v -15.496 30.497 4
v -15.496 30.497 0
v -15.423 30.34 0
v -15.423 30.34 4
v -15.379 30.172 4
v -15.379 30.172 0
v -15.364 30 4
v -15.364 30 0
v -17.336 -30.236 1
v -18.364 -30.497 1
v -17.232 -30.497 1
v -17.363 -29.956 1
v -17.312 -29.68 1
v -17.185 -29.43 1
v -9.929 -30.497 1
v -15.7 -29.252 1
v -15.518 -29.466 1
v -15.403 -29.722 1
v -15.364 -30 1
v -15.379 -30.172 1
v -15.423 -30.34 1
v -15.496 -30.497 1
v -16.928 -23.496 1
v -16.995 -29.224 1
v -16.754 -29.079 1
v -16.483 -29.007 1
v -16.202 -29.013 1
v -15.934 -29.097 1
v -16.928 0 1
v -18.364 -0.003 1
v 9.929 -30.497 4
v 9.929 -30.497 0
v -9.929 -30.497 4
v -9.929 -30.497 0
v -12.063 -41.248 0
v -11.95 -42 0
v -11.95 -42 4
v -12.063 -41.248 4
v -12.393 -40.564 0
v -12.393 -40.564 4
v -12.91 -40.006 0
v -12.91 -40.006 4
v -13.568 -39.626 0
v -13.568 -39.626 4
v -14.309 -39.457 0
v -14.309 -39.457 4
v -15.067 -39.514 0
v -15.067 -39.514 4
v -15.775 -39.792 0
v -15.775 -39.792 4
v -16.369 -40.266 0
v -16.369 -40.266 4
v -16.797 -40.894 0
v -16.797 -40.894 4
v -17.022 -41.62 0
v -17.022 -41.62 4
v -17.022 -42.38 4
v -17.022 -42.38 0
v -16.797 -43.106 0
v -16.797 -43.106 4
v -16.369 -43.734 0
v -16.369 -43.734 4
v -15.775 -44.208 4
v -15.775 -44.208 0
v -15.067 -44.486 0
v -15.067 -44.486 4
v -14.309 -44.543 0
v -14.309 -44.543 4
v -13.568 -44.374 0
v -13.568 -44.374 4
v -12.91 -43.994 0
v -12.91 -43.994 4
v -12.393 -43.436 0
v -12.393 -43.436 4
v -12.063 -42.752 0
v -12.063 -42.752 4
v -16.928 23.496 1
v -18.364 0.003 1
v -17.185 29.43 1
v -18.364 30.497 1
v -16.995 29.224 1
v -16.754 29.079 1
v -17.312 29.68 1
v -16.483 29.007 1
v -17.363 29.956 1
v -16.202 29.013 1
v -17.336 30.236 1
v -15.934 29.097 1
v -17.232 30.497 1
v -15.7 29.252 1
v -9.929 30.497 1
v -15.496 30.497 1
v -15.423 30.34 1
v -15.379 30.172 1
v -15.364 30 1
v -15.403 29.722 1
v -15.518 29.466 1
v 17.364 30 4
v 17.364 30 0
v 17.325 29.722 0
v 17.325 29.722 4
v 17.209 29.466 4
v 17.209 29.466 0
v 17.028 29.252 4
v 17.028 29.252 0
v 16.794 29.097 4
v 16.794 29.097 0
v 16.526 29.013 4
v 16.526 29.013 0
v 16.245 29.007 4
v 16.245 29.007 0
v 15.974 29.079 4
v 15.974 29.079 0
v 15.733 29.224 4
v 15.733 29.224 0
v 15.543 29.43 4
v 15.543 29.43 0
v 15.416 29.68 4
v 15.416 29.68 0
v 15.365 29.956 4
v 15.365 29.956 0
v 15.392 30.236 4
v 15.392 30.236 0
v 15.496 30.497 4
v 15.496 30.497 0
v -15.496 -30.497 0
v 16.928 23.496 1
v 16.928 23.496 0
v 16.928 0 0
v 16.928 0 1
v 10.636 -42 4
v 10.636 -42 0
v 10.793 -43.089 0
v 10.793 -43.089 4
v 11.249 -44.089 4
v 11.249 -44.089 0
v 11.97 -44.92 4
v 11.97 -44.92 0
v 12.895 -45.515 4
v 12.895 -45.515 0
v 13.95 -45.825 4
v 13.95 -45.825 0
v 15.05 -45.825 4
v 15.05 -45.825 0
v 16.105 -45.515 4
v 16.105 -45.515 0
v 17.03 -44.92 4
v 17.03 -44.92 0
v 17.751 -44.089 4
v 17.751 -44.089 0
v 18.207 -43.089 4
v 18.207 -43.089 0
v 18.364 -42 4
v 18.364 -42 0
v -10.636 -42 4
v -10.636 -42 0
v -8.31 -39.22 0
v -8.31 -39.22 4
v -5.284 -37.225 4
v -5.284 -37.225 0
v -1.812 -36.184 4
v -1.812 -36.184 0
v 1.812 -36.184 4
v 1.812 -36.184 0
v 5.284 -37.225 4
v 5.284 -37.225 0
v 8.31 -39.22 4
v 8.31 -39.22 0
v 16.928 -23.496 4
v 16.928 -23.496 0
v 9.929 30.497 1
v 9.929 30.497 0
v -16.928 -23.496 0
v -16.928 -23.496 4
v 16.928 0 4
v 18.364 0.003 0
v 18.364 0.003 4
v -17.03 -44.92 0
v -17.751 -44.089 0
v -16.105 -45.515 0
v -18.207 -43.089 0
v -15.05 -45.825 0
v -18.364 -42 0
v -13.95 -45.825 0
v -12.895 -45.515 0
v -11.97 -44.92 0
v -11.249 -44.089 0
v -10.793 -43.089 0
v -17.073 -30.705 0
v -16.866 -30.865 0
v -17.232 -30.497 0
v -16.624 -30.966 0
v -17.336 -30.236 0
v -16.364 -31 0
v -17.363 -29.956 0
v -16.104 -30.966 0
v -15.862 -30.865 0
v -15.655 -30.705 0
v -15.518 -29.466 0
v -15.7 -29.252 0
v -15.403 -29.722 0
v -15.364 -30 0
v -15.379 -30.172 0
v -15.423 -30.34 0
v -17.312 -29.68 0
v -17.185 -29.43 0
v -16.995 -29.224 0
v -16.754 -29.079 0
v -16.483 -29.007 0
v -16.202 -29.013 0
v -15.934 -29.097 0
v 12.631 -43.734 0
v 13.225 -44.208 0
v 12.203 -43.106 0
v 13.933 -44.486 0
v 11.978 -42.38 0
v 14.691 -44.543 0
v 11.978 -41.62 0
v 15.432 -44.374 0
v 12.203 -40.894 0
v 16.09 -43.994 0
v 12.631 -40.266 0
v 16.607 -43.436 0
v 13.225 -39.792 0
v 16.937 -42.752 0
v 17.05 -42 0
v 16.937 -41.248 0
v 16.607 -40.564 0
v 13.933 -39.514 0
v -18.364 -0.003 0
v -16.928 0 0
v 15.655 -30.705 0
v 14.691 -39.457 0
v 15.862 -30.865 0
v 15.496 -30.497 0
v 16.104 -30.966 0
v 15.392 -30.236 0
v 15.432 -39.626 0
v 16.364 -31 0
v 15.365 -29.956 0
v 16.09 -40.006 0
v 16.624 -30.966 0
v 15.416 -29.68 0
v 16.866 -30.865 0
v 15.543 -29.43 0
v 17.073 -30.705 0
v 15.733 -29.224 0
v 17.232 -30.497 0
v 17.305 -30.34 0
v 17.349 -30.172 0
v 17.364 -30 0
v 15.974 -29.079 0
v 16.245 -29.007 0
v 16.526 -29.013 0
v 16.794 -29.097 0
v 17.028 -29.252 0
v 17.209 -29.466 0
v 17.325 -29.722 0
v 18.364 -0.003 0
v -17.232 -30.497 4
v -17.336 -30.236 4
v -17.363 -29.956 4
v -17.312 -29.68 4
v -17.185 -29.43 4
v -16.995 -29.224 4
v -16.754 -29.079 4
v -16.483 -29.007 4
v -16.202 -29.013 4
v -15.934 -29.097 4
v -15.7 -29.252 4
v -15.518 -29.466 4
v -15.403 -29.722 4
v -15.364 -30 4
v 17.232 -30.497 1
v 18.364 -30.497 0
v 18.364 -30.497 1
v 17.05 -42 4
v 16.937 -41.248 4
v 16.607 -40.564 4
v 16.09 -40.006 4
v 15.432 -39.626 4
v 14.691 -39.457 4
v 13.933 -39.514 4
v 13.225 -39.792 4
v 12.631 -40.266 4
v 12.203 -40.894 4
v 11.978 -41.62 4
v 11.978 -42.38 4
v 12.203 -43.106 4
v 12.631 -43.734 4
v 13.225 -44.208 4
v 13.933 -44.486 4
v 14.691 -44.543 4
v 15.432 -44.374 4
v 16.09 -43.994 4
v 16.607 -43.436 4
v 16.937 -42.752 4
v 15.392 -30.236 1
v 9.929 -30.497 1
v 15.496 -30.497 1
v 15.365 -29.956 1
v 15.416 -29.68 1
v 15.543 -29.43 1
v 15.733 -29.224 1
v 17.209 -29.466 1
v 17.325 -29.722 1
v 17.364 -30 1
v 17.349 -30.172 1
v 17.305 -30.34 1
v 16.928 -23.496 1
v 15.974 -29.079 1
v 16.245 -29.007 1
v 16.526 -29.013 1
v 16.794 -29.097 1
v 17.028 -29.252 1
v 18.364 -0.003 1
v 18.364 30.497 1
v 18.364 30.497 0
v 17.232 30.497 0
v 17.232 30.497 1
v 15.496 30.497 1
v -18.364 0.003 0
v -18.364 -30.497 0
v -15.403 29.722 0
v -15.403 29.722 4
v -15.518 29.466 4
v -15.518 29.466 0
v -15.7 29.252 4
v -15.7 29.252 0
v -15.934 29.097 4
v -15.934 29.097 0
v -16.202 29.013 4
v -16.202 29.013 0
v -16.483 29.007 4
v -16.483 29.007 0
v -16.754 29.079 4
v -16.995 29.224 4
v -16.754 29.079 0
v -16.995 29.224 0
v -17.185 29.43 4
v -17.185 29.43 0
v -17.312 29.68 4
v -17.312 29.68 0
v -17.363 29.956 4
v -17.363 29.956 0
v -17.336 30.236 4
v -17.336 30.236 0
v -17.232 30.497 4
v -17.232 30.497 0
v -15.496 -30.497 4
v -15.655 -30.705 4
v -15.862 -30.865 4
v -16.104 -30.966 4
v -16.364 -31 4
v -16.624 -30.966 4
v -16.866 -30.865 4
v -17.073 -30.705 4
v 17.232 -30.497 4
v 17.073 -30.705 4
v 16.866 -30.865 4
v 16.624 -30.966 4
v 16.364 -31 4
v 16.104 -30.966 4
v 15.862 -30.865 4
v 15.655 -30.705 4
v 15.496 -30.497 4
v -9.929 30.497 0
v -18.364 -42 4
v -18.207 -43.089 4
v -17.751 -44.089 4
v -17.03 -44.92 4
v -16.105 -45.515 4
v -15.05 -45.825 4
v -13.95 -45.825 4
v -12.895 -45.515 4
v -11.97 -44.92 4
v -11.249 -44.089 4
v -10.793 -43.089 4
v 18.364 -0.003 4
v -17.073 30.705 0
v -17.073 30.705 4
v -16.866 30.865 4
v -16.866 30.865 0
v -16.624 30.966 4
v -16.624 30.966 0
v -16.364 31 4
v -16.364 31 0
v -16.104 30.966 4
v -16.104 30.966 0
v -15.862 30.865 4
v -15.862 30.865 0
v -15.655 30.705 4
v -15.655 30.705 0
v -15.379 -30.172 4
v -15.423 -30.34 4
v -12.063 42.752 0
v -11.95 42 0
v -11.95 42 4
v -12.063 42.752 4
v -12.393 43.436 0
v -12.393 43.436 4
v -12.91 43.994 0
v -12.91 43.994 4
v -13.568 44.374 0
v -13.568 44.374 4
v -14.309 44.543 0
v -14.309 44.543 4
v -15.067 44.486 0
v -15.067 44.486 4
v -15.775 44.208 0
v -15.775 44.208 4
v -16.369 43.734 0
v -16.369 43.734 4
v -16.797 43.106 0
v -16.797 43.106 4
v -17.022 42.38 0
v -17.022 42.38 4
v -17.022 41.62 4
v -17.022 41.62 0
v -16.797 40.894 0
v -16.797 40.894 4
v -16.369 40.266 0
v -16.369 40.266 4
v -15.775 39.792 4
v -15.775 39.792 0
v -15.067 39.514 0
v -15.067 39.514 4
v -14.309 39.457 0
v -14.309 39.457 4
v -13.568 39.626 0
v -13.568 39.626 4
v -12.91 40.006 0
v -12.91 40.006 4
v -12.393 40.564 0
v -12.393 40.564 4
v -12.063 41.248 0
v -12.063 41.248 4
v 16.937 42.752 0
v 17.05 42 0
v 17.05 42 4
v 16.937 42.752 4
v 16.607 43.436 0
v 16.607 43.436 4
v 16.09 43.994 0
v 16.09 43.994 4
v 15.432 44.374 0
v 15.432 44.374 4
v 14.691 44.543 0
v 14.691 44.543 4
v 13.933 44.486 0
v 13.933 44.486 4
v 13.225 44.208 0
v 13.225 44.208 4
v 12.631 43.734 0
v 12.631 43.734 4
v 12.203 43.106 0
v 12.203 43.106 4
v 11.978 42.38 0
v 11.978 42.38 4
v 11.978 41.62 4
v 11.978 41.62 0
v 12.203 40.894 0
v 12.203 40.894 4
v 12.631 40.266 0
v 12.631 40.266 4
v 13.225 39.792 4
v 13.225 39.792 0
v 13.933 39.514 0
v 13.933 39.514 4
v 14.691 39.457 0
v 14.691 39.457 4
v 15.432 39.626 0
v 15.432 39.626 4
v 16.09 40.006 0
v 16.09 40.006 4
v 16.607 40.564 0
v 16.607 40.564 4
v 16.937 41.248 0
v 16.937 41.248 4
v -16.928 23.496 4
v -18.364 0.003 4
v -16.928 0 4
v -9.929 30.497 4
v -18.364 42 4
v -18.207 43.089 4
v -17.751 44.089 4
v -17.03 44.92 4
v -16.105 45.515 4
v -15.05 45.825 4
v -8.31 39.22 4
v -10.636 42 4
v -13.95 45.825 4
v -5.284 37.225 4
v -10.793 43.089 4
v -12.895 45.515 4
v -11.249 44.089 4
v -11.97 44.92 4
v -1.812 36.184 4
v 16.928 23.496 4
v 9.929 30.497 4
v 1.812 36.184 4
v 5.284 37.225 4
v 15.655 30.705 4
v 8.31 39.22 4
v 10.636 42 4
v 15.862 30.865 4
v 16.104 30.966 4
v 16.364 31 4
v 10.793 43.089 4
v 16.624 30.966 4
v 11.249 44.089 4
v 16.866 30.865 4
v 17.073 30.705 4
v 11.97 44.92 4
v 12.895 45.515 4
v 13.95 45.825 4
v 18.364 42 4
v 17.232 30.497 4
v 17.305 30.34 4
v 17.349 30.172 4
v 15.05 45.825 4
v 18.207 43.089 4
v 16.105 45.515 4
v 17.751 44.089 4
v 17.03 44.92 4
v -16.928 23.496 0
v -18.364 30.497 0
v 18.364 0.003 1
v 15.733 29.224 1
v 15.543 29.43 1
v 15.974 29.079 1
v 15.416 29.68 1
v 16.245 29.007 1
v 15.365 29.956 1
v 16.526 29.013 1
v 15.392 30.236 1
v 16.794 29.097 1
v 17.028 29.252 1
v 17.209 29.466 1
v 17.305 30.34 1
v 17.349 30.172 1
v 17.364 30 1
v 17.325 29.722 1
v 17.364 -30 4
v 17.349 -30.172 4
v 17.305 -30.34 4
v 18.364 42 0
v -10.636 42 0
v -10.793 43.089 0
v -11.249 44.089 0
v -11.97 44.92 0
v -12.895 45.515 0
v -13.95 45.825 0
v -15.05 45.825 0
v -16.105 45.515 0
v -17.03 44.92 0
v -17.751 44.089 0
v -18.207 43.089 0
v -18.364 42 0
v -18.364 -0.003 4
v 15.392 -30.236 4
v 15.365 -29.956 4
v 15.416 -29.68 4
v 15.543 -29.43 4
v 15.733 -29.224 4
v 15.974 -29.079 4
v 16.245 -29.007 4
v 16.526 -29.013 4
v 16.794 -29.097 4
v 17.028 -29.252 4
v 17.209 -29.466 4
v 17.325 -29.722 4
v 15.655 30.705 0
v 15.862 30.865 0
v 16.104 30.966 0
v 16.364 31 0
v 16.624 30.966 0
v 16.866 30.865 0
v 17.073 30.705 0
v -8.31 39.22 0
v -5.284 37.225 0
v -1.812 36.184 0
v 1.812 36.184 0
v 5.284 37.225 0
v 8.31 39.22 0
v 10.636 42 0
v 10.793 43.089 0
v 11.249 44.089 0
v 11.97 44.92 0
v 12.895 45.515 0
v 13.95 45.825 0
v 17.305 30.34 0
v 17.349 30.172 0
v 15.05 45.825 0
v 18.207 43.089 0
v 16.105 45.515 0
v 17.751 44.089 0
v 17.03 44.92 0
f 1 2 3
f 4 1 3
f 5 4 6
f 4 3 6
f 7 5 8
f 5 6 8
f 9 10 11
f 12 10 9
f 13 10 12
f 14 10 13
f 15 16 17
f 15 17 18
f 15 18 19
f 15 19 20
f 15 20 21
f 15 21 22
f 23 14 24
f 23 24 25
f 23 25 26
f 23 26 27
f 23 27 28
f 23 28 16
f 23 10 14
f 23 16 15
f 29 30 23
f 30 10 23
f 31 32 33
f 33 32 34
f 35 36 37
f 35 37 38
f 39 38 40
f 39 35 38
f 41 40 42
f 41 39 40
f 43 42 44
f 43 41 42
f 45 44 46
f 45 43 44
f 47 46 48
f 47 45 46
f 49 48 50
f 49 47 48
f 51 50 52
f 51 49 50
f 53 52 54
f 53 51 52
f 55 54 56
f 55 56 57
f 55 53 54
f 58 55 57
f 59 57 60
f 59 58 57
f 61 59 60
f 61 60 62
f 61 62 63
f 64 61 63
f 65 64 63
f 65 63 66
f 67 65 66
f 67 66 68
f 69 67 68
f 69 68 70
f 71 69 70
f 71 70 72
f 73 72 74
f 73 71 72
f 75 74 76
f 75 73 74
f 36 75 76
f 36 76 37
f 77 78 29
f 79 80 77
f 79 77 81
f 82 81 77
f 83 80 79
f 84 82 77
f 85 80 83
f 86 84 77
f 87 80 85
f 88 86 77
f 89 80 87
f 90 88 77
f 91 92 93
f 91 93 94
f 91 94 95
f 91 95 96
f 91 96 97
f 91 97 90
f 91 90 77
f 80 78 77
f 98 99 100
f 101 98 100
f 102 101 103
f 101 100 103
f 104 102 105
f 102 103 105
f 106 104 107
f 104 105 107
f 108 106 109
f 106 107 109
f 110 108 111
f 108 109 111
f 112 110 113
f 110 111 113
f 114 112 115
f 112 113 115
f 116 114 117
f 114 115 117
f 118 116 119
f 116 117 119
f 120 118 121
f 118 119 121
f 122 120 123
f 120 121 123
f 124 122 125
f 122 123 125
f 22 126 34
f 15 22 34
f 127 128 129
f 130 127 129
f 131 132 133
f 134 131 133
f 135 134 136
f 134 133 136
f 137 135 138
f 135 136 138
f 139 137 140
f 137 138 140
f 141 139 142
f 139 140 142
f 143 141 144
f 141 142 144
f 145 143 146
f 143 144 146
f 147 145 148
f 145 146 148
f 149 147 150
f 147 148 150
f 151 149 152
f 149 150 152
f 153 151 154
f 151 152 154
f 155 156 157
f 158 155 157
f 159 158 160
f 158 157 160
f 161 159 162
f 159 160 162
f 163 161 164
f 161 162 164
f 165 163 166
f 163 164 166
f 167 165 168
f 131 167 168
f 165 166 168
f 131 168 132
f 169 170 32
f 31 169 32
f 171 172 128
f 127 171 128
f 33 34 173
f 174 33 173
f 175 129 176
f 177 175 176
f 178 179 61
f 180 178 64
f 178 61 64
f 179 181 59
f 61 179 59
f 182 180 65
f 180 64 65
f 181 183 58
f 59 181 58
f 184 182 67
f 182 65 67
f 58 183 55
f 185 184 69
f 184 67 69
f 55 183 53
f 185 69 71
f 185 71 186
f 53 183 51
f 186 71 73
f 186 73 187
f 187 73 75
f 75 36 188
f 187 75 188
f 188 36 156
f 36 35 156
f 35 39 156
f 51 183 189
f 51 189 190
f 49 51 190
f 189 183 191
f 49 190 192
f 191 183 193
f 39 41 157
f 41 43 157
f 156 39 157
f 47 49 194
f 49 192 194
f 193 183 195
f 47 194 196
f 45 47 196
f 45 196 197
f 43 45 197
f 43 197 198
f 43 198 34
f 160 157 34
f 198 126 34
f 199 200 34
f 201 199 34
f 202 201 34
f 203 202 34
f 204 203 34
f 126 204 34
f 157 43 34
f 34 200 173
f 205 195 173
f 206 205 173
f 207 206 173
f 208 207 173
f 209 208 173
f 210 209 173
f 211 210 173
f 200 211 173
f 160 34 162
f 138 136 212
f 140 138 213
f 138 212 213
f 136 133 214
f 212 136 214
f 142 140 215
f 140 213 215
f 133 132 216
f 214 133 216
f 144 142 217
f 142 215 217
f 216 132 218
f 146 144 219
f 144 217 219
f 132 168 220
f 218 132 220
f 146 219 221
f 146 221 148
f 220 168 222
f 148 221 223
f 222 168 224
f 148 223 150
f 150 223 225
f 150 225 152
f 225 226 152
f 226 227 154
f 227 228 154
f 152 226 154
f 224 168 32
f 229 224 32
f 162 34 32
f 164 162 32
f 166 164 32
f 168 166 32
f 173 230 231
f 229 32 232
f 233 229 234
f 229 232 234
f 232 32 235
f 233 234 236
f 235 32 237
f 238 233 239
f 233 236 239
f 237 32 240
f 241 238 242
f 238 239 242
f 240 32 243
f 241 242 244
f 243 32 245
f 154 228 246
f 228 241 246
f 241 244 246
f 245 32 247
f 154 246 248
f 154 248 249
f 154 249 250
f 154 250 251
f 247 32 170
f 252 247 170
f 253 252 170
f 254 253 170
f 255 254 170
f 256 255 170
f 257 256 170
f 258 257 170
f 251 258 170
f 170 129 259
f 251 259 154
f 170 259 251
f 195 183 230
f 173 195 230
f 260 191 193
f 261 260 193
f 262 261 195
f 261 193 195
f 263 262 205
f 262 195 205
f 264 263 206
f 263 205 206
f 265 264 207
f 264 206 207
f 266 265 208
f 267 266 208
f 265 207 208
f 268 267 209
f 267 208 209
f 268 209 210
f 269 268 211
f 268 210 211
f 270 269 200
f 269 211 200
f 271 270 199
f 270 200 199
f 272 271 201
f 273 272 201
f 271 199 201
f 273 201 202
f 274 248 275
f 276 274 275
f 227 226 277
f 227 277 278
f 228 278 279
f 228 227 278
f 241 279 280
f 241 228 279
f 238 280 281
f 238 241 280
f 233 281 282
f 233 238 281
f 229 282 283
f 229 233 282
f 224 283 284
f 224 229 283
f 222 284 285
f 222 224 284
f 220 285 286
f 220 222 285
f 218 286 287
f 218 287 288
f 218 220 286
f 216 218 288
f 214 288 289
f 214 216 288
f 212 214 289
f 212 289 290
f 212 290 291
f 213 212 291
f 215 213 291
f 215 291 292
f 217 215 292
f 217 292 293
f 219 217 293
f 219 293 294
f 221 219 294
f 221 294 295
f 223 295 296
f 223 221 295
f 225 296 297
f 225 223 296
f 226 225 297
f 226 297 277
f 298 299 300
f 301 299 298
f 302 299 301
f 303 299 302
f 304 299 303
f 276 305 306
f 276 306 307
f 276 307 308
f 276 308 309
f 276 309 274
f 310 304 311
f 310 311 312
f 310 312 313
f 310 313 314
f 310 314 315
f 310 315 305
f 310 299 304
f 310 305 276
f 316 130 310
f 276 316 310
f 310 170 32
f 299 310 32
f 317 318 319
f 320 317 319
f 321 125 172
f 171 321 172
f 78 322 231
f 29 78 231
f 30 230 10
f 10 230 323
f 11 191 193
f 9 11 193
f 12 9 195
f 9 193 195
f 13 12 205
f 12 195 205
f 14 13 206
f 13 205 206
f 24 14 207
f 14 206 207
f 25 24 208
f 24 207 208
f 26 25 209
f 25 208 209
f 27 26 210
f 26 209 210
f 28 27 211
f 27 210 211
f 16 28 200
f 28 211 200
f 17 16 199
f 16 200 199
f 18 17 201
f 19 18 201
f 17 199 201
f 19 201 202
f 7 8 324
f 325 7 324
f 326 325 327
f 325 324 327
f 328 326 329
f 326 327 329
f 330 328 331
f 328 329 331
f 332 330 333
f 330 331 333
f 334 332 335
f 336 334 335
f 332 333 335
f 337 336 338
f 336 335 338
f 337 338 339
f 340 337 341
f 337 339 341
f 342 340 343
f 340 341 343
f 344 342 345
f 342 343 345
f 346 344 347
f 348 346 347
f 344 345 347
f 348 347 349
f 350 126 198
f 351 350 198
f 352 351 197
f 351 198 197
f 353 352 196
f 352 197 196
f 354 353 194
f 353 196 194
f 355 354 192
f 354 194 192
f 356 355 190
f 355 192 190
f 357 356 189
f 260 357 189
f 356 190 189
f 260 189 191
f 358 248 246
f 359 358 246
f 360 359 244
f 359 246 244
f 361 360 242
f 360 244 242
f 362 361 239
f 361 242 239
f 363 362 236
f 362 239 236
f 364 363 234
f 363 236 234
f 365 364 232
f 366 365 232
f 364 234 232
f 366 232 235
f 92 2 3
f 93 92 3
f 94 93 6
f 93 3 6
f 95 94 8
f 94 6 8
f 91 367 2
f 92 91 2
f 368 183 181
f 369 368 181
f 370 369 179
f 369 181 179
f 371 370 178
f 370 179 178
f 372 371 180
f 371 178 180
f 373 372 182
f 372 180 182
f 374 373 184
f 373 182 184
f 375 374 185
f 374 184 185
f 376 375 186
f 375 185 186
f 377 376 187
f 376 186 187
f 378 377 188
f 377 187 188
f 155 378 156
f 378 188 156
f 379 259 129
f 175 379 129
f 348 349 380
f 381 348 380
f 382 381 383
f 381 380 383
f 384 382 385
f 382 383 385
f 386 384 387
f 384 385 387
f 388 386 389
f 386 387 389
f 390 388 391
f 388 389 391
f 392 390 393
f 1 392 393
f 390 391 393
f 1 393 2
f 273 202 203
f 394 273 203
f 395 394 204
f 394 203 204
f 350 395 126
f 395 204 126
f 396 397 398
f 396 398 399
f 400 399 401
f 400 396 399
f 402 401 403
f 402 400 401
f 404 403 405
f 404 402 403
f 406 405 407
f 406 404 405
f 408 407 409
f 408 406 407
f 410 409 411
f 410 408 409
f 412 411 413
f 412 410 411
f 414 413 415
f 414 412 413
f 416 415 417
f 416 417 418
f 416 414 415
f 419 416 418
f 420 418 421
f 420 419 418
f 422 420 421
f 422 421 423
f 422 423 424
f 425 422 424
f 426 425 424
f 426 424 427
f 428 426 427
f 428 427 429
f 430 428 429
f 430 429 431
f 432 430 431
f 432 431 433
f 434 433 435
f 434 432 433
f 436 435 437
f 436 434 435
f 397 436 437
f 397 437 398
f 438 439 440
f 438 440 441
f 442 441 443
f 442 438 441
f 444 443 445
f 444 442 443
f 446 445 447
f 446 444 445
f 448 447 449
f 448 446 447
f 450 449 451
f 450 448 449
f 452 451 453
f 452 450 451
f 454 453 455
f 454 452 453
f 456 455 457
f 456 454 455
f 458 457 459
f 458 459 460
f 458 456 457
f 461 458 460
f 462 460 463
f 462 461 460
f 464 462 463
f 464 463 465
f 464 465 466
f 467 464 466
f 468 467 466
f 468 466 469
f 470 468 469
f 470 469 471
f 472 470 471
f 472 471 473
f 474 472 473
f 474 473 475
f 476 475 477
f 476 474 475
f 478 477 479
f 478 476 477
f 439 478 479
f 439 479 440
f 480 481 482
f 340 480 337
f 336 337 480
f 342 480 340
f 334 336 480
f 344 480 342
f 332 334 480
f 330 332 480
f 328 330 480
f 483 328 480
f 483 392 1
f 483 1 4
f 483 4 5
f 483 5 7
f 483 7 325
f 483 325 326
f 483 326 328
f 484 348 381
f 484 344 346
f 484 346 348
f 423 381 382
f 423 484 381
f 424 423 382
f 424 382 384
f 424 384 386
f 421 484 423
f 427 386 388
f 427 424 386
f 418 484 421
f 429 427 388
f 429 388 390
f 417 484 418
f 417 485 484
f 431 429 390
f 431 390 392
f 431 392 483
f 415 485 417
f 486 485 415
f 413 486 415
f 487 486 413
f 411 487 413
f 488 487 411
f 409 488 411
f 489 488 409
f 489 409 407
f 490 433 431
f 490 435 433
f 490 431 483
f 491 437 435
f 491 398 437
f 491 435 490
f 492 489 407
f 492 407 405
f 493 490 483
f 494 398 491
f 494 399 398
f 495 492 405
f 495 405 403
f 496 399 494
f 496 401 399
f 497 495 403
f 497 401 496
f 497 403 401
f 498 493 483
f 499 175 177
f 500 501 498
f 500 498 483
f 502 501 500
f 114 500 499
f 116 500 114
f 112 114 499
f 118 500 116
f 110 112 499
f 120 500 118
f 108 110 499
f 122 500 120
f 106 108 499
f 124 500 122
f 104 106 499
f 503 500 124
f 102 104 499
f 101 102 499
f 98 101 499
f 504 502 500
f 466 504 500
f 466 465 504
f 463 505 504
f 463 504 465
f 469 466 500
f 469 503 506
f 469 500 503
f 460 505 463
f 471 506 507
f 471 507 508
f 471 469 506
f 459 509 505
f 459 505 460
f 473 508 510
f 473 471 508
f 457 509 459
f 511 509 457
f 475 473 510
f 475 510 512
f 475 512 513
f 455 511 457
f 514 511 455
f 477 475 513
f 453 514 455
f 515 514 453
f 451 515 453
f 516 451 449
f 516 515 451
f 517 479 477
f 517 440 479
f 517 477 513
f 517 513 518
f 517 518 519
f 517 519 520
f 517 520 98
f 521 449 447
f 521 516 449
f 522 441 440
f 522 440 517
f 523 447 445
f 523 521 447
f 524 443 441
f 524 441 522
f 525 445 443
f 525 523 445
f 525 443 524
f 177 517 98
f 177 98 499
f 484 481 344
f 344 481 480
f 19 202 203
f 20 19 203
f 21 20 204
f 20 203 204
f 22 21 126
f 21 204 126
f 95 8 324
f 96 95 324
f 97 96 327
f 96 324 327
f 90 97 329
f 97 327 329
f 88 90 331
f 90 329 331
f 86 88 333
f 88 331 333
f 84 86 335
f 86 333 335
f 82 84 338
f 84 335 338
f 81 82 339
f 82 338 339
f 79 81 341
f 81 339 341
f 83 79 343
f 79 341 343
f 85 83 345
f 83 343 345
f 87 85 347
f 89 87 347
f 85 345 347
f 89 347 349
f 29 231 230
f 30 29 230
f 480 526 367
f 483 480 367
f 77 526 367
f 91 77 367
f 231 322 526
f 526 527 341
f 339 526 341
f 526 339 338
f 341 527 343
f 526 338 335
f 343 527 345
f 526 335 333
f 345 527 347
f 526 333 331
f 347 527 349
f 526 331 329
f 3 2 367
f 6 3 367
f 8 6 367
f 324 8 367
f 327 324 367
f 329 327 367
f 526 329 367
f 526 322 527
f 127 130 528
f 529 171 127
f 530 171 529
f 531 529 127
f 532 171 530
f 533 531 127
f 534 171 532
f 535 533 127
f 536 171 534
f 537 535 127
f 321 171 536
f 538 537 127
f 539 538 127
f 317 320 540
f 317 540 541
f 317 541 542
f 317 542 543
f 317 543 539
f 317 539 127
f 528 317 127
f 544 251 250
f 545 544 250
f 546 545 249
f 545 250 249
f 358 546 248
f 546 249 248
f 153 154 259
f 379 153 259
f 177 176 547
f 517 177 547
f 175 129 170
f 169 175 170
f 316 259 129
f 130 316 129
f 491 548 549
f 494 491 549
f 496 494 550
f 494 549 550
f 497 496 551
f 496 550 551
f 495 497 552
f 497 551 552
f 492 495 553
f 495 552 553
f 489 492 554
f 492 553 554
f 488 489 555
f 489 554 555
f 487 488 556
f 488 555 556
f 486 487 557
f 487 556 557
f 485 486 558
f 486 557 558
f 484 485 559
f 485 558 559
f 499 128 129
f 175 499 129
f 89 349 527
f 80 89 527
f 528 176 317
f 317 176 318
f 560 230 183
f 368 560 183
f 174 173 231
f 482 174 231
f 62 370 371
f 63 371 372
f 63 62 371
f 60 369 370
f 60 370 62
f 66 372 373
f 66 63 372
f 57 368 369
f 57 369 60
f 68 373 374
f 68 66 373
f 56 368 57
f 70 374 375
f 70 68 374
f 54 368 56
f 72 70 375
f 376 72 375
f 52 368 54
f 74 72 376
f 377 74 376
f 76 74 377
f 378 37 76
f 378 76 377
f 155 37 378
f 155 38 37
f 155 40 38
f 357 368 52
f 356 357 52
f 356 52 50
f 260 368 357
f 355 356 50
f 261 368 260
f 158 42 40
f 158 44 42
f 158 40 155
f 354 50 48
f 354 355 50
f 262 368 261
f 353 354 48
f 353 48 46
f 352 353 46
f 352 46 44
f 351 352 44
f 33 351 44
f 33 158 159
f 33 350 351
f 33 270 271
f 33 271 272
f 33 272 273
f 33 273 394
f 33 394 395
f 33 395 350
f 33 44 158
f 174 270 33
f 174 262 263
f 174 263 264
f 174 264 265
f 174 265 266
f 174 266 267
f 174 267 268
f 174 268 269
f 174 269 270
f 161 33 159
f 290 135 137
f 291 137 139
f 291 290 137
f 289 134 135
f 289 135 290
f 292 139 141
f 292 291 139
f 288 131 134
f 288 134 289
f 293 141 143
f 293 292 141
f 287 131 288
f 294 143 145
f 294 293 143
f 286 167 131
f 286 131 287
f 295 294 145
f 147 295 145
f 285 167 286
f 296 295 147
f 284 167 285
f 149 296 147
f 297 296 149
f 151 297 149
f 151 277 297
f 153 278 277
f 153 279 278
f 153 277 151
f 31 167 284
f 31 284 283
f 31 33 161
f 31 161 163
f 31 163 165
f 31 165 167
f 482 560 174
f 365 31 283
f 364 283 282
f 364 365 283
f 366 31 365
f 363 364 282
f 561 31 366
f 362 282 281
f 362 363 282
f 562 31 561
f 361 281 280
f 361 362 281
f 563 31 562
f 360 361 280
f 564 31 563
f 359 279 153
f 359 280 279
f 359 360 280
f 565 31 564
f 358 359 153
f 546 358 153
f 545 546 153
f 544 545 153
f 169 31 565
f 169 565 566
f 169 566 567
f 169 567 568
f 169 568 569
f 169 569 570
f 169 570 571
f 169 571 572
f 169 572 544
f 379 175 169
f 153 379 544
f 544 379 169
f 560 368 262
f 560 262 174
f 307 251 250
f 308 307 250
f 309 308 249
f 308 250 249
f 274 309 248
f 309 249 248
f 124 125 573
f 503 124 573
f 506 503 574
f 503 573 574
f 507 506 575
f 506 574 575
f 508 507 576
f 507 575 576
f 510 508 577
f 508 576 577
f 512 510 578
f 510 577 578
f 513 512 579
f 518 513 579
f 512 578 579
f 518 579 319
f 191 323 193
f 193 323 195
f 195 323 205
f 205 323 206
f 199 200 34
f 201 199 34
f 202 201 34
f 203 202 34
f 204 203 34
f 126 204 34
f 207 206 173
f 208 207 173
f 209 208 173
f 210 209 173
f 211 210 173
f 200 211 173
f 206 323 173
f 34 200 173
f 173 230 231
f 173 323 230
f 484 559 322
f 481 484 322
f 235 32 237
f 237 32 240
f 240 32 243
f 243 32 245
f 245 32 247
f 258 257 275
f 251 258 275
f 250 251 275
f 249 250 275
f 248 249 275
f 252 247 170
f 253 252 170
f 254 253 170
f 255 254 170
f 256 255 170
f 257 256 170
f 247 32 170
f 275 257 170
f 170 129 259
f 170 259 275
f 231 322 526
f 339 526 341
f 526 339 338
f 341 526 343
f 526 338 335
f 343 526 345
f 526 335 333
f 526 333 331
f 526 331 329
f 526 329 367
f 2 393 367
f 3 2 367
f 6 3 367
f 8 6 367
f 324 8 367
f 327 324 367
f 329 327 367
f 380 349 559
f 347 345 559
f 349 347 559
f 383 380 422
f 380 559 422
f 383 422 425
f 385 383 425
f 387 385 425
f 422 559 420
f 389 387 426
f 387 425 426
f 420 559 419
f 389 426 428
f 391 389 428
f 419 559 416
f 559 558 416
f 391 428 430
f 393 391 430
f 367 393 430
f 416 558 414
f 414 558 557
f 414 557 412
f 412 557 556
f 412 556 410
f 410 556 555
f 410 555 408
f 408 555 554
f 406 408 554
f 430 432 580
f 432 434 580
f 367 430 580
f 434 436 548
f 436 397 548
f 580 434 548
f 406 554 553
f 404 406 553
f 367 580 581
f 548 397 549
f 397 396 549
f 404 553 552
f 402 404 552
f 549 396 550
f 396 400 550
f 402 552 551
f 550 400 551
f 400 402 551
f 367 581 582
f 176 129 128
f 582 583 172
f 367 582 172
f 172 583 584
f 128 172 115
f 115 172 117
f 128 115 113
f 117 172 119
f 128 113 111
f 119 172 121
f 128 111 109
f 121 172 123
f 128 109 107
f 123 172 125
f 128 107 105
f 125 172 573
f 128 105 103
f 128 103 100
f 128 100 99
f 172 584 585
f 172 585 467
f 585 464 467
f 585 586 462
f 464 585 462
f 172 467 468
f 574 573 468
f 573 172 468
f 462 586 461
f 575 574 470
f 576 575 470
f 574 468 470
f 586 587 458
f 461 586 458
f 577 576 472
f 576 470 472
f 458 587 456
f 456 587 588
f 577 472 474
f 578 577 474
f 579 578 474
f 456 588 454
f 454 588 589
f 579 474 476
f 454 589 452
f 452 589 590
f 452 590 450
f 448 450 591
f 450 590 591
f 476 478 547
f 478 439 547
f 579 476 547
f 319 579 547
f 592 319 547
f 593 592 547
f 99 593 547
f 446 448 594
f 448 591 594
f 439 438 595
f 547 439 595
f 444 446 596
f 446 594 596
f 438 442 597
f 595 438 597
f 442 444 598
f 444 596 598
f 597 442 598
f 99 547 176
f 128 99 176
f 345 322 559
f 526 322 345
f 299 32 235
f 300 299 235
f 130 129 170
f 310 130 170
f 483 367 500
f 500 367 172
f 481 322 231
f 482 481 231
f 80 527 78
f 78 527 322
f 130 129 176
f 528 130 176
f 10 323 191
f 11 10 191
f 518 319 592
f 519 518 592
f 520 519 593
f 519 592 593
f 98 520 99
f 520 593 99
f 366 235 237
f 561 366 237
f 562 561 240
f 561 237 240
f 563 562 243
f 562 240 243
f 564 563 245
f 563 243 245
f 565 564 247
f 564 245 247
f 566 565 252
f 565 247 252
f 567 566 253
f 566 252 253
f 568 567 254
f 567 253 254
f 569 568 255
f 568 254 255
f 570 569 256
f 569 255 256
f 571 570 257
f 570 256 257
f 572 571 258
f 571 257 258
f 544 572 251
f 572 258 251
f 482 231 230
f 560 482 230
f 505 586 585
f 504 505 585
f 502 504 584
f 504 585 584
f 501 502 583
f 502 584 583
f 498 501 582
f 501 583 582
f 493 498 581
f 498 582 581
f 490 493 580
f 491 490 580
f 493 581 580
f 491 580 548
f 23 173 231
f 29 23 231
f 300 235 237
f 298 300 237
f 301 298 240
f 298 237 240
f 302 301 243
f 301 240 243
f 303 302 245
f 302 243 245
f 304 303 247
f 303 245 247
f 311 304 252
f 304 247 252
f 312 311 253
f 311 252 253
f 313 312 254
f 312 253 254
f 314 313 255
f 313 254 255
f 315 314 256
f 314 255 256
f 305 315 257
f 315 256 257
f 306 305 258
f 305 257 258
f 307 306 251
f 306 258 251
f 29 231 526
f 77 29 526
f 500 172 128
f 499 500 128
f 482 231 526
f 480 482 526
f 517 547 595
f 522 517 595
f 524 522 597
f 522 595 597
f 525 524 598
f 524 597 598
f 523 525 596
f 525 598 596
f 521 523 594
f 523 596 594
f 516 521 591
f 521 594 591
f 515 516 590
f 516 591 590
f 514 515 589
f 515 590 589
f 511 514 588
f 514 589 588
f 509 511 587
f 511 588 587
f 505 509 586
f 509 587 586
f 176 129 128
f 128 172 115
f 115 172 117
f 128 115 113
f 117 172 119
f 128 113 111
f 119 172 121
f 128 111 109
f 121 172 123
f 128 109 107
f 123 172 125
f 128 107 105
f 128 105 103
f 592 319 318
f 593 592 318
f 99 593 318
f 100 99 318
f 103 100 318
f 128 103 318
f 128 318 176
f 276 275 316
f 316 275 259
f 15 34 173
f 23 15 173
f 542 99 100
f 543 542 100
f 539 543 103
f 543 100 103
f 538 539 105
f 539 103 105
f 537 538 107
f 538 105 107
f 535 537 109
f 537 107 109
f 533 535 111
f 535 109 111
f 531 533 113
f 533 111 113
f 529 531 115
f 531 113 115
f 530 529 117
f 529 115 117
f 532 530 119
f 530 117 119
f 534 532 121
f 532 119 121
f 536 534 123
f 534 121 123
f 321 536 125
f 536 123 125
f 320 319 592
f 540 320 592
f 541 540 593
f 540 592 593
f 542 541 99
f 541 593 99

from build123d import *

# Parameters (mm, degrees)
F1_DEPTH = 1
F0_R     = 2.55
F2_DEPTH = 4


with BuildPart() as f1:
    # F0 (on Top) → F1 (new body)
    with BuildSketch(Plane.XY):
        with BuildLine():
            Line((-16.928318, 23.495577), (-9.929332, 30.496591))
            Line((-9.929332, 30.496591), (-15.49595, 30.496591))
            ThreePointArc((-15.49595, 30.496591), (-15.397502, 30.25692), (-15.363935, 30))
            ThreePointArc((-15.363935, 30), (-16.620854, 29.033567), (-17.231919, 30.496591))
            Line((-17.231919, 30.496591), (-18.363935, 30.496591))
            Line((-18.363935, 30.496591), (-18.363935, 0.003409))
            Line((-18.363935, 0.003409), (-16.928318, 0))
            Line((-16.928318, 0), (-16.928318, 23.495577))
        make_face()
        with BuildLine():
            Line((-16.928318, -23.495577), (-16.928318, 0))
            Line((-16.928318, 0), (-18.363935, -0.003409))
            Line((-18.363935, -0.003409), (-18.363935, -30.496591))
            Line((-18.363935, -30.496591), (-17.231919, -30.496591))
            ThreePointArc((-17.231919, -30.496591), (-16.620854, -29.033567), (-15.363935, -30))
            ThreePointArc((-15.363935, -30), (-15.397502, -30.25692), (-15.49595, -30.496591))
            Line((-15.49595, -30.496591), (-9.929332, -30.496591))
            Line((-9.929332, -30.496591), (-16.928318, -23.495577))
        make_face()
        with BuildLine():
            Line((15.49595, 30.496591), (9.929332, 30.496591))
            Line((9.929332, 30.496591), (16.928318, 23.495577))
            Line((16.928318, 23.495577), (16.928318, 0))
            Line((16.928318, 0), (18.363935, 0.003409))
            Line((18.363935, 0.003409), (18.363935, 30.496591))
            Line((18.363935, 30.496591), (17.231919, 30.496591))
            ThreePointArc((17.231919, 30.496591), (17.330367, 30.25692), (17.363935, 30))
            ThreePointArc((17.363935, 30), (16.107015, 29.033567), (15.49595, 30.496591))
        make_face()
        with BuildLine():
            Line((18.363935, -0.003409), (16.928318, 0))
            Line((16.928318, 0), (16.928318, -23.495577))
            Line((16.928318, -23.495577), (9.929332, -30.496591))
            Line((9.929332, -30.496591), (15.49595, -30.496591))
            ThreePointArc((15.49595, -30.496591), (16.107015, -29.033567), (17.363935, -30))
            ThreePointArc((17.363935, -30), (17.330367, -30.25692), (17.231919, -30.496591))
            Line((17.231919, -30.496591), (18.363935, -30.496591))
            Line((18.363935, -30.496591), (18.363935, -0.003409))
        make_face()
    extrude(amount=F1_DEPTH)


with BuildPart() as f2:
    # F0 (on Top) → F2 (new body)
    with BuildSketch(Plane.XY):
        with BuildLine():
            Line((0, 30.496591), (9.929332, 30.496591))
            Line((9.929332, 30.496591), (15.49595, 30.496591))
            ThreePointArc((15.49595, 30.496591), (16.363935, 31), (17.231919, 30.496591))
            Line((17.231919, 30.496591), (18.363935, 30.496591))
            Line((18.363935, 30.496591), (18.363935, 42))
            ThreePointArc((18.363935, 42), (14.5, 45.863935), (10.636065, 42))
            ThreePointArc((10.636065, 42), (0, 36.051413), (-10.636065, 42))
            ThreePointArc((-10.636065, 42), (-14.5, 45.863935), (-18.363935, 42))
            Line((-18.363935, 42), (-18.363935, 30.496591))
            Line((-18.363935, 30.496591), (-17.231919, 30.496591))
            ThreePointArc((-17.231919, 30.496591), (-16.363935, 31), (-15.49595, 30.496591))
            Line((-15.49595, 30.496591), (-9.929332, 30.496591))
            Line((-9.929332, 30.496591), (0, 30.496591))
        make_face()
        with Locations((-14.5, 42)):
            Circle(F0_R, mode=Mode.SUBTRACT)
        with Locations((14.5, 42)):
            Circle(F0_R, mode=Mode.SUBTRACT)
        with BuildLine():
            Line((18.363935, -42), (18.363935, -30.496591))
            Line((18.363935, -30.496591), (17.231919, -30.496591))
            ThreePointArc((17.231919, -30.496591), (16.363935, -31), (15.49595, -30.496591))
            Line((15.49595, -30.496591), (9.929332, -30.496591))
            Line((9.929332, -30.496591), (0, -30.496591))
            Line((0, -30.496591), (-9.929332, -30.496591))
            Line((-9.929332, -30.496591), (-15.49595, -30.496591))
            ThreePointArc((-15.49595, -30.496591), (-16.363935, -31), (-17.231919, -30.496591))
            Line((-17.231919, -30.496591), (-18.363935, -30.496591))
            Line((-18.363935, -30.496591), (-18.363935, -42))
            ThreePointArc((-18.363935, -42), (-14.5, -45.863935), (-10.636065, -42))
            ThreePointArc((-10.636065, -42), (0, -36.051413), (10.636065, -42))
            ThreePointArc((10.636065, -42), (14.5, -45.863935), (18.363935, -42))
        make_face()
        with Locations((-14.5, -42)):
            Circle(F0_R, mode=Mode.SUBTRACT)
        with Locations((14.5, -42)):
            Circle(F0_R, mode=Mode.SUBTRACT)
        with BuildLine():
            Line((15.49595, 30.496591), (9.929332, 30.496591))
            Line((9.929332, 30.496591), (16.928318, 23.495577))
            Line((16.928318, 23.495577), (16.928318, 0))
            Line((16.928318, 0), (18.363935, 0.003409))
            Line((18.363935, 0.003409), (18.363935, 30.496591))
            Line((18.363935, 30.496591), (17.231919, 30.496591))
            ThreePointArc((17.231919, 30.496591), (17.330367, 30.25692), (17.363935, 30))
            ThreePointArc((17.363935, 30), (16.107015, 29.033567), (15.49595, 30.496591))
        make_face()
        with BuildLine():
            Line((-16.928318, 23.495577), (-9.929332, 30.496591))
            Line((-9.929332, 30.496591), (-15.49595, 30.496591))
            ThreePointArc((-15.49595, 30.496591), (-15.397502, 30.25692), (-15.363935, 30))
            ThreePointArc((-15.363935, 30), (-16.620854, 29.033567), (-17.231919, 30.496591))
            Line((-17.231919, 30.496591), (-18.363935, 30.496591))
            Line((-18.363935, 30.496591), (-18.363935, 0.003409))
            Line((-18.363935, 0.003409), (-16.928318, 0))
            Line((-16.928318, 0), (-16.928318, 23.495577))
        make_face()
        with BuildLine():
            Line((18.363935, -0.003409), (16.928318, 0))
            Line((16.928318, 0), (16.928318, -23.495577))
            Line((16.928318, -23.495577), (9.929332, -30.496591))
            Line((9.929332, -30.496591), (15.49595, -30.496591))
            ThreePointArc((15.49595, -30.496591), (16.107015, -29.033567), (17.363935, -30))
            ThreePointArc((17.363935, -30), (17.330367, -30.25692), (17.231919, -30.496591))
            Line((17.231919, -30.496591), (18.363935, -30.496591))
            Line((18.363935, -30.496591), (18.363935, -0.003409))
        make_face()
        with BuildLine():
            Line((-16.928318, -23.495577), (-16.928318, 0))
            Line((-16.928318, 0), (-18.363935, -0.003409))
            Line((-18.363935, -0.003409), (-18.363935, -30.496591))
            Line((-18.363935, -30.496591), (-17.231919, -30.496591))
            ThreePointArc((-17.231919, -30.496591), (-16.620854, -29.033567), (-15.363935, -30))
            ThreePointArc((-15.363935, -30), (-15.397502, -30.25692), (-15.49595, -30.496591))
            Line((-15.49595, -30.496591), (-9.929332, -30.496591))
            Line((-9.929332, -30.496591), (-16.928318, -23.495577))
        make_face()
    extrude(amount=F2_DEPTH)


solid = Compound([f1.part, f2.part])
